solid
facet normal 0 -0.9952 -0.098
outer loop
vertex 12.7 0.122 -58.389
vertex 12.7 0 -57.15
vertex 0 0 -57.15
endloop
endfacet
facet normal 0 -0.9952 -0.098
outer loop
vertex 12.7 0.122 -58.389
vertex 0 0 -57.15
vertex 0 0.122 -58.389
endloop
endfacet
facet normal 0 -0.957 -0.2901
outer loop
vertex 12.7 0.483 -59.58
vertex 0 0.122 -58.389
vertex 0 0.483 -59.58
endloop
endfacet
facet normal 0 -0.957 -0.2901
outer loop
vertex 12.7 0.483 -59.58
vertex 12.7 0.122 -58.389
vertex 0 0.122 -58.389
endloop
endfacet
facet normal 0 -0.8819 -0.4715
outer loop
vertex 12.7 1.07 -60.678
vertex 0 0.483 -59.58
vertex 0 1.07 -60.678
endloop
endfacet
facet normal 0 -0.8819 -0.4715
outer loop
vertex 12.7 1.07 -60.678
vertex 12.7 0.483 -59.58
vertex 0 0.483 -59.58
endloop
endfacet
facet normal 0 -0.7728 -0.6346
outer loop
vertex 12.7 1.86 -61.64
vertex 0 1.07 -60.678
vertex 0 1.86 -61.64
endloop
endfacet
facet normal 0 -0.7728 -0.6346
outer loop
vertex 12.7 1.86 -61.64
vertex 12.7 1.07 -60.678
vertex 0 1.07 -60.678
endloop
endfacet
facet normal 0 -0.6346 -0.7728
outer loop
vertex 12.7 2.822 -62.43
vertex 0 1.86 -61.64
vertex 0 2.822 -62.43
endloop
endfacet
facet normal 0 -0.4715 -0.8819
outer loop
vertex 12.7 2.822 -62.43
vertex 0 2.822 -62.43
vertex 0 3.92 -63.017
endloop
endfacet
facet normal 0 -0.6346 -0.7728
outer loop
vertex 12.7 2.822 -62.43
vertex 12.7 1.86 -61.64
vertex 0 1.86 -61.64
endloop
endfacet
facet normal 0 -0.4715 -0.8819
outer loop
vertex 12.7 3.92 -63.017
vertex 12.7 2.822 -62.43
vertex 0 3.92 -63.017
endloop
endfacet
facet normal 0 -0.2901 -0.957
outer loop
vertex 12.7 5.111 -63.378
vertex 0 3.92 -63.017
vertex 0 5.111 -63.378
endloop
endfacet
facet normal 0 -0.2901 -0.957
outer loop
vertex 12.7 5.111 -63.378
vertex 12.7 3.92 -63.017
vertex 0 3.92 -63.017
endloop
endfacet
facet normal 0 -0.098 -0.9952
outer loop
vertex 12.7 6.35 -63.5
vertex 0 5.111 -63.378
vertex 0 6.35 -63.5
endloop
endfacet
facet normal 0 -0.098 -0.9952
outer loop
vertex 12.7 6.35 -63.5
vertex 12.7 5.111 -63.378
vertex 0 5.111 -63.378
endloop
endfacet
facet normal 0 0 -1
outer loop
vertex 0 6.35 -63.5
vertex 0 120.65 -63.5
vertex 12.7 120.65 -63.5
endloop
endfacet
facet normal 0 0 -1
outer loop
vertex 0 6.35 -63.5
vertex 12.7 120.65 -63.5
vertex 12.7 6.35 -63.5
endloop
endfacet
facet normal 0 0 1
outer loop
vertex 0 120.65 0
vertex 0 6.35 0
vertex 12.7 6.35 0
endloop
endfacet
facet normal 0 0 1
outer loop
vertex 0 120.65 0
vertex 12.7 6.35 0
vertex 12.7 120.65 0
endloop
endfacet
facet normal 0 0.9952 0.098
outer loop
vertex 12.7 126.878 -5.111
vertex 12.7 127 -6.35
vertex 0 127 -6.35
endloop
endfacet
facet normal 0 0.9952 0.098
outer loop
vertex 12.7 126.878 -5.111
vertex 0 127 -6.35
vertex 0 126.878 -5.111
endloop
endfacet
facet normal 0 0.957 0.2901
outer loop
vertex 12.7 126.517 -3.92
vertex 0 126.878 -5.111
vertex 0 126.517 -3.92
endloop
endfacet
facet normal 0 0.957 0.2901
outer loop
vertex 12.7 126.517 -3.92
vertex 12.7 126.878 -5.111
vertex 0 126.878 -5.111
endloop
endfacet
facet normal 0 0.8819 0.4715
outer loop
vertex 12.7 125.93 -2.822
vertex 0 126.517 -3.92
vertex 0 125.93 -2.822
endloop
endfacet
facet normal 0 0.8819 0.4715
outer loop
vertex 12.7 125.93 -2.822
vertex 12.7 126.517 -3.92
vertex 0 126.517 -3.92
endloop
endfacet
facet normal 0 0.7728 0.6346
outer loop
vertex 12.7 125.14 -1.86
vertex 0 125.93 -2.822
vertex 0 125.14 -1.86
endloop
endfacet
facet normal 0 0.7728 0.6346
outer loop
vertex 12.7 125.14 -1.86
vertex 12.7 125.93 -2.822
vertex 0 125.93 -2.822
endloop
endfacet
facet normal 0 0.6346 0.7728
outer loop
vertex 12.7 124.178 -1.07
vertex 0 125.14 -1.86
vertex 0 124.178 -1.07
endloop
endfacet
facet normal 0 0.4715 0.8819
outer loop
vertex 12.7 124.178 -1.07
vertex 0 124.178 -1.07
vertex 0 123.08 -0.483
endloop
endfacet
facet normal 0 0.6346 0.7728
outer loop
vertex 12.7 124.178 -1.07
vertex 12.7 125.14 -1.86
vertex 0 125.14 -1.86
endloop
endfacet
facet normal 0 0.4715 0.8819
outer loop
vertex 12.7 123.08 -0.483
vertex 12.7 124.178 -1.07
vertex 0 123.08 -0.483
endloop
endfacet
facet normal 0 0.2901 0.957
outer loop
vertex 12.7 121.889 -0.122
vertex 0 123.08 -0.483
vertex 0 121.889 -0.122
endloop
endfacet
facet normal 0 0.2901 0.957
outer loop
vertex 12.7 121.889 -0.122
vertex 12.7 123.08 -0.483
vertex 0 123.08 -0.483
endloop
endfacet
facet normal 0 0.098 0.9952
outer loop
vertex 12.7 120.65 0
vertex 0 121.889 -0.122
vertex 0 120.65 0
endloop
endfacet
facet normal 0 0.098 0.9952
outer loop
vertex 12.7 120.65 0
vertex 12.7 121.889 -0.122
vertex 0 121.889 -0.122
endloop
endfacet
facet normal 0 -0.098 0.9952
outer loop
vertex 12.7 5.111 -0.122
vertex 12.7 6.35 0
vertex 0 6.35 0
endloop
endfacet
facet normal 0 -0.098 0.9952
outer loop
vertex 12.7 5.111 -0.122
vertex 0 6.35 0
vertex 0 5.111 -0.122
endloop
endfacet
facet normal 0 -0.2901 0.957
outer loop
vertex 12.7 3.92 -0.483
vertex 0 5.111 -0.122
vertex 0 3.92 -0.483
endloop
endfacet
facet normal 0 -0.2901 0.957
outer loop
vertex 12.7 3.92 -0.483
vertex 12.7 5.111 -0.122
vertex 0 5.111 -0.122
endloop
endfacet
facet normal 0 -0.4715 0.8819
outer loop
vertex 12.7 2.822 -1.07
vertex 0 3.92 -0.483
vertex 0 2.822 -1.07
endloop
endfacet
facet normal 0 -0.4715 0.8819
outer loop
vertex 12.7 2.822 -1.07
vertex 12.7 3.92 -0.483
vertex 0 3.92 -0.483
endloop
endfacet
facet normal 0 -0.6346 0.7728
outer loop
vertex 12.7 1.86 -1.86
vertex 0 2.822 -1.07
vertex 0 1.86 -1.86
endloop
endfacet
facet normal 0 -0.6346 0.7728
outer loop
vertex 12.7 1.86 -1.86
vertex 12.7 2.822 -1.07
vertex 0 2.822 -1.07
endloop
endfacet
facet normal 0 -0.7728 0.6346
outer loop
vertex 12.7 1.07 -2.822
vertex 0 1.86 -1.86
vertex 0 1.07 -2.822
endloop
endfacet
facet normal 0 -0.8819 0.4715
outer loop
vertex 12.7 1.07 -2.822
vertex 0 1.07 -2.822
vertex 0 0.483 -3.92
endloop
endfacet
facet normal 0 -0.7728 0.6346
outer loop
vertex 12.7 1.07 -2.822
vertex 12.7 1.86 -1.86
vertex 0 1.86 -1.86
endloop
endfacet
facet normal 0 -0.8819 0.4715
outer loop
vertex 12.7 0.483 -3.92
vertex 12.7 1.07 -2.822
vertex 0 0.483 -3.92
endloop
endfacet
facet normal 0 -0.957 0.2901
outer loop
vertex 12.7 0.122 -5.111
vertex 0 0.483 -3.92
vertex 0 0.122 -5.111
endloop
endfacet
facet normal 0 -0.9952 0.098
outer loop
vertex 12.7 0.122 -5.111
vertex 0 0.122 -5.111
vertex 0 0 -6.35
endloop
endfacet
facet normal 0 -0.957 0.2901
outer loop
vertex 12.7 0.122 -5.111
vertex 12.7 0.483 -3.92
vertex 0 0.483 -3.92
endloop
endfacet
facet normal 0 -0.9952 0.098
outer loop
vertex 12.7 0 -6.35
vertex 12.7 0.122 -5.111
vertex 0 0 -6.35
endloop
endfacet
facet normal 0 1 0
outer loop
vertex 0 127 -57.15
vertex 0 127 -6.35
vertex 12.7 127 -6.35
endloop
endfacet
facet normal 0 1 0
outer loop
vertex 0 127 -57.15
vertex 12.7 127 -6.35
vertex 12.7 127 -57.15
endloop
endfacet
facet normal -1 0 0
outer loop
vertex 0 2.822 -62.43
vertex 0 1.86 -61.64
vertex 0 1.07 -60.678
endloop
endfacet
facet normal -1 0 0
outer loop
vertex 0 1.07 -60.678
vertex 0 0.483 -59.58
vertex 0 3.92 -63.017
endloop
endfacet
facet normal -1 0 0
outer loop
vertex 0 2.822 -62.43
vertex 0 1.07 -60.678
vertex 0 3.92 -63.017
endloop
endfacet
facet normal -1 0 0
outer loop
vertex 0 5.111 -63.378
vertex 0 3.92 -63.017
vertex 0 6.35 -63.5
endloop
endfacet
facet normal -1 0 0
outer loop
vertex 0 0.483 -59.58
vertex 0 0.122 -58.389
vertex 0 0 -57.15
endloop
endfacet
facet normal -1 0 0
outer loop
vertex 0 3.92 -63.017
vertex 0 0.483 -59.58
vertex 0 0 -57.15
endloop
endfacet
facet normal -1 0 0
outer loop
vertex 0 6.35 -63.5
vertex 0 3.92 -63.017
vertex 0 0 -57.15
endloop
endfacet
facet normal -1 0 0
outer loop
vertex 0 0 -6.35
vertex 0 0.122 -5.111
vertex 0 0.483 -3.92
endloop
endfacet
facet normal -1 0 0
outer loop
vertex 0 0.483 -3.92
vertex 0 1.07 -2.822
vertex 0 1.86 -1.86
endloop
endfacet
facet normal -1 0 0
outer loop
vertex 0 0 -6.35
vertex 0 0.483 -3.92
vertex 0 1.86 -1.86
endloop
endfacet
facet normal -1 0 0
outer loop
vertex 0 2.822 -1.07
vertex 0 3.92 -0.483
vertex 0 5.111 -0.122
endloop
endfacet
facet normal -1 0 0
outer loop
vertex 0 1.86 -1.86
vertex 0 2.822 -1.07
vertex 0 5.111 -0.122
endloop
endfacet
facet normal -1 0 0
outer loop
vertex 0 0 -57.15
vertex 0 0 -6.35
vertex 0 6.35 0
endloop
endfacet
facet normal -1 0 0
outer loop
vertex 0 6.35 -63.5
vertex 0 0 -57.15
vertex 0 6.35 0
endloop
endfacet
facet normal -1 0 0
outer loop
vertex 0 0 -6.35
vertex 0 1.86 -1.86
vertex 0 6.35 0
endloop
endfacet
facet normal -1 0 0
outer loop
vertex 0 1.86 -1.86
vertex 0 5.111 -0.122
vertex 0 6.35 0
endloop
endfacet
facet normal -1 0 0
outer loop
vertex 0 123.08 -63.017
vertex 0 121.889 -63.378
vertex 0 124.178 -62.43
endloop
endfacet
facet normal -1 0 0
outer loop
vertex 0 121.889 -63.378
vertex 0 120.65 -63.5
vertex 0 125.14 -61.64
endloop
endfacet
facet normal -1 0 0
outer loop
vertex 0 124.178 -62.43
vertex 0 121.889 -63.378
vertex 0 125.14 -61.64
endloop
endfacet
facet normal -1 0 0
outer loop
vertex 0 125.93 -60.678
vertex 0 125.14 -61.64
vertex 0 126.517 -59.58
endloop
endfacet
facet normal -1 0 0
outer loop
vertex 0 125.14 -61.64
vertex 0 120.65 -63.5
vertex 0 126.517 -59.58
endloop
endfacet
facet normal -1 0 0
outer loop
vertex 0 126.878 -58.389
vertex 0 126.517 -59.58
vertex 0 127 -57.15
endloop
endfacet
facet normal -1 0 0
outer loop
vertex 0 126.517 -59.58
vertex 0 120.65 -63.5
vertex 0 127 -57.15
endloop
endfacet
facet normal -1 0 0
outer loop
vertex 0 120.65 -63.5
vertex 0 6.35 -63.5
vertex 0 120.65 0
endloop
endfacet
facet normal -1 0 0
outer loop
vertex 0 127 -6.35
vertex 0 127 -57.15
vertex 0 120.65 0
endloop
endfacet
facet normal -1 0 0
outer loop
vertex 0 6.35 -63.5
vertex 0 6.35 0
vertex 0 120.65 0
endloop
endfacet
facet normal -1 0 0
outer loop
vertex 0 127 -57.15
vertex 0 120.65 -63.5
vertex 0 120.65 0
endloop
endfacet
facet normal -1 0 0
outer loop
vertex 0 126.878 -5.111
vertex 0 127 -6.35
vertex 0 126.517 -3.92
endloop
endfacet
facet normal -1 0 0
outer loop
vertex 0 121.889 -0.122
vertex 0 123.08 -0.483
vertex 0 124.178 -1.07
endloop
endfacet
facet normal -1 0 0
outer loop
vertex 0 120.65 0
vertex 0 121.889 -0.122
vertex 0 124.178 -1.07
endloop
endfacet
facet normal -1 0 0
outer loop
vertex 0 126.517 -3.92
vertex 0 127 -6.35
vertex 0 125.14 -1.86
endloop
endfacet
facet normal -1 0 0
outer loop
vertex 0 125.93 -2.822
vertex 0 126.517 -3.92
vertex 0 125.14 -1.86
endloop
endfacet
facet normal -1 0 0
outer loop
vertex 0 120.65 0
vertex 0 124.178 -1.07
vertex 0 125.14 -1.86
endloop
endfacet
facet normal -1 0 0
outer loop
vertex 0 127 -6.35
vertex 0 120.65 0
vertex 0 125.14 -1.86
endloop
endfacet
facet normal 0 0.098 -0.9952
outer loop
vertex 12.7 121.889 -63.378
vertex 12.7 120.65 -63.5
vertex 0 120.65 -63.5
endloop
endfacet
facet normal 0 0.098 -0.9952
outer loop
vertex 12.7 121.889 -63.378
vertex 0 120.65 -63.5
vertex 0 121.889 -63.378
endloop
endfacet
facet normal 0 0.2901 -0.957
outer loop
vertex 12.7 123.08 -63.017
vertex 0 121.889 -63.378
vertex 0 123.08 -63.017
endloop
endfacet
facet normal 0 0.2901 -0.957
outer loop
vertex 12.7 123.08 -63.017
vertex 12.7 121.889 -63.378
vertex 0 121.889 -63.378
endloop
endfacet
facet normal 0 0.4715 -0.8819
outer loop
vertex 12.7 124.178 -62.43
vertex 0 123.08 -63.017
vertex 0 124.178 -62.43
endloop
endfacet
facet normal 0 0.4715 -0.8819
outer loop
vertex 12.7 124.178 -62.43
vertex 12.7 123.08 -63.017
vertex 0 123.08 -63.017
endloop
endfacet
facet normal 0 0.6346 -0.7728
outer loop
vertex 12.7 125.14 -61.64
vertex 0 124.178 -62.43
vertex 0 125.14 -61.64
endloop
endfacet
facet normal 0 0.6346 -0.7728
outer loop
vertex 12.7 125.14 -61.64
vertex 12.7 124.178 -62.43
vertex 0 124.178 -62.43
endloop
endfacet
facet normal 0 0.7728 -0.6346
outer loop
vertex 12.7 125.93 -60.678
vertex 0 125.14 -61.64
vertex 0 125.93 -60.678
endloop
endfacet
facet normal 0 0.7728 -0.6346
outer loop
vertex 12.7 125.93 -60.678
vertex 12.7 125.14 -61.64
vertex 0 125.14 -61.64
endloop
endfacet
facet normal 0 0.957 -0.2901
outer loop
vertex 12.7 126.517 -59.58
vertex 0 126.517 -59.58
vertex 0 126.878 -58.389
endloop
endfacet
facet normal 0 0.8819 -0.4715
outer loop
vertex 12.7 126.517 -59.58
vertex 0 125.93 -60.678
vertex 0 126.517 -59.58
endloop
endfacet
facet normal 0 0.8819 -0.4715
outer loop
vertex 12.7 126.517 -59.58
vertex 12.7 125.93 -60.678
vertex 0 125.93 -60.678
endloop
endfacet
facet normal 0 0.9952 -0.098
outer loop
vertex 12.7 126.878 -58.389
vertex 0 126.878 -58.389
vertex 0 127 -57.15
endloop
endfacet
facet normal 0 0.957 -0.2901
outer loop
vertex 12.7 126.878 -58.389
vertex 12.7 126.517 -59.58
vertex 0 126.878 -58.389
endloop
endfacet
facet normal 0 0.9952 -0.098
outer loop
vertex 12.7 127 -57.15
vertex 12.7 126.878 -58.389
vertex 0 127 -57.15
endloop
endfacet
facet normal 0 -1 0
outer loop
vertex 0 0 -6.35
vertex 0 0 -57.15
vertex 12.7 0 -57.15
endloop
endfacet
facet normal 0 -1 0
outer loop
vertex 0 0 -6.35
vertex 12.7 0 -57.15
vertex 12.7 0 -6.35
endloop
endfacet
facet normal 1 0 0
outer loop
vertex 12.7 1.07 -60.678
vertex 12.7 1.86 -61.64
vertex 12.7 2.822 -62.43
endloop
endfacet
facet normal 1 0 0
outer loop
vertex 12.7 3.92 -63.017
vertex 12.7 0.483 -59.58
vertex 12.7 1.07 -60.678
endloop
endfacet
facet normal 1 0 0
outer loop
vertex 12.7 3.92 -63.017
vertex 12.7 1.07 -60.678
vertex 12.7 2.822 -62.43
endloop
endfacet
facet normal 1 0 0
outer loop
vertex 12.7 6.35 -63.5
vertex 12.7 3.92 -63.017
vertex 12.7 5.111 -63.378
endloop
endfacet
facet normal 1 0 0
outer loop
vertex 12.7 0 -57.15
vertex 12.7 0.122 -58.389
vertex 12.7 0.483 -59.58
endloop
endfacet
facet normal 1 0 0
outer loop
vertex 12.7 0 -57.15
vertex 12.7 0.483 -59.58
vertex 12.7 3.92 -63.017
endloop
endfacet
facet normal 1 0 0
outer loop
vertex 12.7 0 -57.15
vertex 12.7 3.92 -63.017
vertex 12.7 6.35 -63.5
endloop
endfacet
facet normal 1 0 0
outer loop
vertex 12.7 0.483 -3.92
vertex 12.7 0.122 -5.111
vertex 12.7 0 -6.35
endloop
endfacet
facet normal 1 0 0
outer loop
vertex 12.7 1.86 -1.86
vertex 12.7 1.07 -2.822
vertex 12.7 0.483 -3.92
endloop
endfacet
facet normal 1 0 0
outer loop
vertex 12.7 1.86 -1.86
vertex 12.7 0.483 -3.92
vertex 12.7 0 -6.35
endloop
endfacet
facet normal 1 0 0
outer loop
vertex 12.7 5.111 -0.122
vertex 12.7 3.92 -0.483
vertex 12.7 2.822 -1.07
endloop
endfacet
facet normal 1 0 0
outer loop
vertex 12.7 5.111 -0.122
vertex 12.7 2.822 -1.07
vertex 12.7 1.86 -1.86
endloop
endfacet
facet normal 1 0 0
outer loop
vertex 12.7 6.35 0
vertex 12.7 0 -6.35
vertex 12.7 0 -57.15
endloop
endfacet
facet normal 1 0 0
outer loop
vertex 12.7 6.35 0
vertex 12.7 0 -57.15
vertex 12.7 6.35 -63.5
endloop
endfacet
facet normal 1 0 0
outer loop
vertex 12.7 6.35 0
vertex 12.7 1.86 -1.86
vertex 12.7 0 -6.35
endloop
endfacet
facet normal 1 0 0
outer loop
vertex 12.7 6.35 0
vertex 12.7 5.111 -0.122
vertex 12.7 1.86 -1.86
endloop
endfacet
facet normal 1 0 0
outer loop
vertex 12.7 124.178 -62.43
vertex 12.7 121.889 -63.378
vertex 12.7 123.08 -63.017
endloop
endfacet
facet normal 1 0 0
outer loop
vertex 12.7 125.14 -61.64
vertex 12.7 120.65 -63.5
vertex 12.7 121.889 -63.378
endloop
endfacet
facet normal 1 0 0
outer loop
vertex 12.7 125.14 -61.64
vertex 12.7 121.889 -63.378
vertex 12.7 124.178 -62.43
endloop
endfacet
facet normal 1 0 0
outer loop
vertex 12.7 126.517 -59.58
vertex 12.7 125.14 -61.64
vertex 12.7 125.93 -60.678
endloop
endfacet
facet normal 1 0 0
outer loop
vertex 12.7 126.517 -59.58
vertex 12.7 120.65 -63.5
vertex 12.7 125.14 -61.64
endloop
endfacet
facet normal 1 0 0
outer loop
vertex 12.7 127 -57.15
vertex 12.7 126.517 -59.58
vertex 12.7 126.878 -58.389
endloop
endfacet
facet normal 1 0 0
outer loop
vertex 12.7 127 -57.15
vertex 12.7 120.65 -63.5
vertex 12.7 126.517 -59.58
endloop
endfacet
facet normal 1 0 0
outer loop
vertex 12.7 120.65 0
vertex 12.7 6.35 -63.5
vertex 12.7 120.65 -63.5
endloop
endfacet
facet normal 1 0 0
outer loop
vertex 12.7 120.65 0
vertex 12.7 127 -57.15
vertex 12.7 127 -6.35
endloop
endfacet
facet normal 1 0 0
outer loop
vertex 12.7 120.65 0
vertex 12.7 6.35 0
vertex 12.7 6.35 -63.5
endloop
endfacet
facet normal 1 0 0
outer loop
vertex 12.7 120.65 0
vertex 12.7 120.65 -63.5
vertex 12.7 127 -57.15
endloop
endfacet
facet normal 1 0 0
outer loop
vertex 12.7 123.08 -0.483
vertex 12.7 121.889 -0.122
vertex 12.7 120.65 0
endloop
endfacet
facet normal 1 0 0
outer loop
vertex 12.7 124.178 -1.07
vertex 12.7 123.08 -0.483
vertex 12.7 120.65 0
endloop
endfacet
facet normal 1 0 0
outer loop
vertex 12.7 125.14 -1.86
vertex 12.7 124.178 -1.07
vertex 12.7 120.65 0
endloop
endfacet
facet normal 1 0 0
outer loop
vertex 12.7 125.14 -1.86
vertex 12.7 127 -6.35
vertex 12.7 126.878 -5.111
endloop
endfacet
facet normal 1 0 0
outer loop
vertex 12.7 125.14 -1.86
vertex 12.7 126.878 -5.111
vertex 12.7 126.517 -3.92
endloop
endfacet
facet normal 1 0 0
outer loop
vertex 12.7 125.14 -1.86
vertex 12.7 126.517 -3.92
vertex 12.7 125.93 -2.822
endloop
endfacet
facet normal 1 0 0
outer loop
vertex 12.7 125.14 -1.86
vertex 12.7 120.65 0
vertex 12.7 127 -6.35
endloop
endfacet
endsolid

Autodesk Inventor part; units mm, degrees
ref_plane "YZ Plane" through (0, 0, 0) normal (1, 0, 0) x (0, 1, 0)
ref_plane "XZ Plane" through (0, 0, 0) normal (0, 1, 0) x (-1, 0, 0)
ref_plane "XY Plane" through (0, 0, 0) normal (0, 0, 1) x (1, 0, 0)
sketch "Sketch1" plane through (0, 0, 0) normal (1, 0, 0) x (0, 1, 0)
  line L0 (0, 0) -> (127, 0)
  line L1 (127, 0) -> (127, -63.5)
  line L2 (127, -63.5) -> (0, -63.5)
  line L3 (0, -63.5) -> (0, 0)
  dimension "d0" = 127
  dimension "d1" = 63.5
extrude "Extrusion1" add sketch "Sketch1" along normal blind 12.7
fillet "Fillet1" radius 6.35 1 edges at (6.35, 127, -63.5)
fillet "Fillet2" radius 6.35 1 edges at (6.35, 127, 0)
fillet "Fillet3" radius 6.35 1 edges at (6.35, 0, 0)
fillet "Fillet4" radius 6.35 1 edges at (6.35, 0, -63.5)
properties part number "Phone"
